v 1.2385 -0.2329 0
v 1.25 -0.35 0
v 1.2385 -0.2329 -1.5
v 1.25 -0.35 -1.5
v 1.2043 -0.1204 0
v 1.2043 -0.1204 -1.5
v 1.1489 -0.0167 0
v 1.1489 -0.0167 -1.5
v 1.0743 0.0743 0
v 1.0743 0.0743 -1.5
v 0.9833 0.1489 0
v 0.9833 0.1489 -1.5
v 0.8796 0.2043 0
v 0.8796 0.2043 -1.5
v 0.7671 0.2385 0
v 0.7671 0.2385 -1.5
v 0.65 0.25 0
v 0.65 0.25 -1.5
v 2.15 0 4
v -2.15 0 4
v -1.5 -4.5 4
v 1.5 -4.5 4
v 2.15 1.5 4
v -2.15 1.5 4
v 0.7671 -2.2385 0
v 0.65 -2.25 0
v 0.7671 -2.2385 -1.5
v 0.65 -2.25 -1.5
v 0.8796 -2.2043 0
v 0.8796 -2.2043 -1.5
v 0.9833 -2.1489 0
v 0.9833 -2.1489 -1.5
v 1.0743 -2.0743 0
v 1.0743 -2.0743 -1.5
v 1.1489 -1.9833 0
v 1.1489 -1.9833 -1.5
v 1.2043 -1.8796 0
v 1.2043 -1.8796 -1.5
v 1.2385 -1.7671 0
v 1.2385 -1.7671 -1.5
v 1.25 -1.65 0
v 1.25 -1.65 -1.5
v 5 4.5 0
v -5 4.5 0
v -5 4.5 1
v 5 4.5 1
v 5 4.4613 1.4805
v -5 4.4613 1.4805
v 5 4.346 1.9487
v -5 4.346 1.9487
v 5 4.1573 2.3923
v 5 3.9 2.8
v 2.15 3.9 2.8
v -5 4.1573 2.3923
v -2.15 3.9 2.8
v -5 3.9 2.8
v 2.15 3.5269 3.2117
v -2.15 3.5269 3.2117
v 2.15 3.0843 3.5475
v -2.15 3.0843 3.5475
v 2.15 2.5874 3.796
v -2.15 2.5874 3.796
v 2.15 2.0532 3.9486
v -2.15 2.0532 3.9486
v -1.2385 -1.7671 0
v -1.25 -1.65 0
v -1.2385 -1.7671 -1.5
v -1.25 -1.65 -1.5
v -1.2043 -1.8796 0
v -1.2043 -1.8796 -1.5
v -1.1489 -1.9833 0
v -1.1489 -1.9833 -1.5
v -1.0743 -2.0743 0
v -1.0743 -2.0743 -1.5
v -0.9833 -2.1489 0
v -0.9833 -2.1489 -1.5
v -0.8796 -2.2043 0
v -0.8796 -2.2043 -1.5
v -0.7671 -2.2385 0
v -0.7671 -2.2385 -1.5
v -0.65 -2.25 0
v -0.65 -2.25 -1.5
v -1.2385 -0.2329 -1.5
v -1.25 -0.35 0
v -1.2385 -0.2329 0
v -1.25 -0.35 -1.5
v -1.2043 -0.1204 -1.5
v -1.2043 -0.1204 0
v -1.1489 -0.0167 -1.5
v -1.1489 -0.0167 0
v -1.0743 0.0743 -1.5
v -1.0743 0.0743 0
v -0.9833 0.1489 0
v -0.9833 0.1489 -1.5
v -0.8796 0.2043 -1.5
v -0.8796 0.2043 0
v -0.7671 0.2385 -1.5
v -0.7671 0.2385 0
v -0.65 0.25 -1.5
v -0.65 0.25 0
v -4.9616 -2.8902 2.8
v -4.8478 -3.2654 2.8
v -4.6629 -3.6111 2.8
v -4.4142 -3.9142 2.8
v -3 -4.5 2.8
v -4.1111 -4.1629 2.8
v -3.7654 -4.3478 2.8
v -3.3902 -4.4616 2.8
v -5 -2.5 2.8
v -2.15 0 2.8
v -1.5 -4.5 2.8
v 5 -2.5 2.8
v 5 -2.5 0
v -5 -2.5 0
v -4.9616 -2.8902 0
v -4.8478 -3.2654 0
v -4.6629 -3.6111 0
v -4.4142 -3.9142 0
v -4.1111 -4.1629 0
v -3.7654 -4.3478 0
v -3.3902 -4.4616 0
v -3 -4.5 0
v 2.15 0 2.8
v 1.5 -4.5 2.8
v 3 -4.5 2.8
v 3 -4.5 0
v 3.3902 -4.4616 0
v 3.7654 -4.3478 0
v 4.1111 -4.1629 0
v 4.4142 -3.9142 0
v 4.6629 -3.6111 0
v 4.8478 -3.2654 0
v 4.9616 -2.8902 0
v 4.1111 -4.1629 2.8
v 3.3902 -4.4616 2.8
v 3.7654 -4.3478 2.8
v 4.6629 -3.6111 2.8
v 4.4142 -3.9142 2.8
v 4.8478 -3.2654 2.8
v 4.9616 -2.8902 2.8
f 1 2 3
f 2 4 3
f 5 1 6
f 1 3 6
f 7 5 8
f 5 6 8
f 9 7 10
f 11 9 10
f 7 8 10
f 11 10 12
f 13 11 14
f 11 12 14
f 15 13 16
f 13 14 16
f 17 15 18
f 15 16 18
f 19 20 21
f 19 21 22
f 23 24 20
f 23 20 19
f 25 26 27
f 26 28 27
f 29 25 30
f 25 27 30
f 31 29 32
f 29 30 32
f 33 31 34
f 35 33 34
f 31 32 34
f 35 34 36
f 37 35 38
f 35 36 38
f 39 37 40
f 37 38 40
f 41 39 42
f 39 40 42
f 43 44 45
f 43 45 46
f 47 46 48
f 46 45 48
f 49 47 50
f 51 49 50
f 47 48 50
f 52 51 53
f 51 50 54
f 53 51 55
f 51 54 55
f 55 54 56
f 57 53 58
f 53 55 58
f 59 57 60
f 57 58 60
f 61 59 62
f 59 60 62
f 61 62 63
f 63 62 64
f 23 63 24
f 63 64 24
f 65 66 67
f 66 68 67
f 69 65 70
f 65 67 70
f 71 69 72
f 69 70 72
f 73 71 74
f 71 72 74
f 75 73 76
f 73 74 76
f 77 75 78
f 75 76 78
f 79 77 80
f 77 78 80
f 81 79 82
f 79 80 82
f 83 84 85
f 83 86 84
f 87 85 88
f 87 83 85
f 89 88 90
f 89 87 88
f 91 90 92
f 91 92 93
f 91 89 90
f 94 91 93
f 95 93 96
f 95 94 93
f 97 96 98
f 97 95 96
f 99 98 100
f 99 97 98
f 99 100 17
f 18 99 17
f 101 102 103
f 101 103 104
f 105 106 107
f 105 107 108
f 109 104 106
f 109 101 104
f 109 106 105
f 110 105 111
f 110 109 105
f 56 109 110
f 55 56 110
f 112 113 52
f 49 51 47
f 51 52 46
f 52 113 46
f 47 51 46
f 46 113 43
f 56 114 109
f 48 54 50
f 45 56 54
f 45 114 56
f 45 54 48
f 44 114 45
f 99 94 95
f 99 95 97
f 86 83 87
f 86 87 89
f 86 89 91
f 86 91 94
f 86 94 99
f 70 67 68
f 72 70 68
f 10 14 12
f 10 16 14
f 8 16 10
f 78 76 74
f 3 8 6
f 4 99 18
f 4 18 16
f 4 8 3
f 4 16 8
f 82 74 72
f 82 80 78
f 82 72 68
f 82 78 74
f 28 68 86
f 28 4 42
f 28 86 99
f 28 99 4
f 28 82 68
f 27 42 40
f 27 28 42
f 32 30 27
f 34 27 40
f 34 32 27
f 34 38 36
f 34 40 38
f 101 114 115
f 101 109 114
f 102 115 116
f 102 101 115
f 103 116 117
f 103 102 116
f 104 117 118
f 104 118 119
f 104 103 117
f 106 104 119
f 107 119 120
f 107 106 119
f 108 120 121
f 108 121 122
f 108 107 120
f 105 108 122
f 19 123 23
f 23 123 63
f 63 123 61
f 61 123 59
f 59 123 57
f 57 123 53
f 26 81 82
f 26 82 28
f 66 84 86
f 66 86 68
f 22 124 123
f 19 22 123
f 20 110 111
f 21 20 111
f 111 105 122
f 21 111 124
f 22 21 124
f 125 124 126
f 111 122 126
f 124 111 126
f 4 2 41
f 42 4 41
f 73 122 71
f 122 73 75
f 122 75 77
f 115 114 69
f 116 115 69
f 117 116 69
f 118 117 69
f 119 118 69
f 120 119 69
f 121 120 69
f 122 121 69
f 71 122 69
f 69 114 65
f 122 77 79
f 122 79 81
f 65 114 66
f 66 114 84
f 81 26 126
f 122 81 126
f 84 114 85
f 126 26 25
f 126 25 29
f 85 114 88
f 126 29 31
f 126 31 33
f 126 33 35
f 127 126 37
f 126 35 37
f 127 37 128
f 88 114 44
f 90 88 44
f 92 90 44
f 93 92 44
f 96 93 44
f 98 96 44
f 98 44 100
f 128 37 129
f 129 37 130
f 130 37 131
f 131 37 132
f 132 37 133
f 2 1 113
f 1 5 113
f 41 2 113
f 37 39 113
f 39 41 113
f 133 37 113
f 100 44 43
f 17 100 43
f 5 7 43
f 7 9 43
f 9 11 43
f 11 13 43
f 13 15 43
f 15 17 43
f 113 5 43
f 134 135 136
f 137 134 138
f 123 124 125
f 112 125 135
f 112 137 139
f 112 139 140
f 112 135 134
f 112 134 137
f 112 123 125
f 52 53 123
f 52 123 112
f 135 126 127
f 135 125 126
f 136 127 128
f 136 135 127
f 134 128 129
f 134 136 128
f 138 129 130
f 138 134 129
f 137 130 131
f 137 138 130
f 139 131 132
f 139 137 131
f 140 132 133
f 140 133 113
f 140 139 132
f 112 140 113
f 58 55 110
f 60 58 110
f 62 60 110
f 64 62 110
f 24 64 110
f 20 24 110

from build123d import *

# Parameters (mm, degrees)
F0_W     = 10
F0_H     = 9
F1_DEPTH = 2.8
F3_DEPTH = 1.2
F4_W     = 2.5
F4_H     = 2.5
F5_DEPTH = 1.5
F6_R     = 2
F7_R     = 3
F8_R     = 0.6


with BuildPart() as f1:
    # F0 (on Top) → F1 (new body)
    with BuildSketch(Plane.XY):
        Rectangle(F0_W, F0_H)
    extrude(amount=F1_DEPTH)

    # F2 (on face) → F3 (join)
    with BuildSketch(Plane.XY.offset(2.8)):
        Polygon((2.15, 4.5), (-2.15, 4.5), (-2.15, 0), (-1.5, -4.5), (1.5, -4.5), (2.15, 0), align=None)
    extrude(amount=F3_DEPTH)

    # F4 (on face) → F5 (join)
    with BuildSketch(Plane(origin=(0, 0, 0), x_dir=(1, 0, 0), z_dir=(0, 0, -1))):
        with Locations((0, 1)):
            Rectangle(F4_W, F4_H)
    extrude(amount=F5_DEPTH)

    # F6
    f6_edges = [f1.edges().sort_by_distance(p)[0] for p in [
        (5, -4.5, 1.4),
        (-5, -4.5, 1.4),
    ]]
    fillet(f6_edges, radius=F6_R)

    # F7
    f7_edges = [f1.edges().sort_by_distance(p)[0] for p in [
        (0, 4.5, 4),
    ]]
    fillet(f7_edges, radius=F7_R)

    # F8
    f8_edges = [f1.edges().sort_by_distance(p)[0] for p in [
        (1.25, -2.25, -0.75),
        (-1.25, -2.25, -0.75),
        (1.25, 0.25, -0.75),
        (-1.25, 0.25, -0.75),
    ]]
    fillet(f8_edges, radius=F8_R)


solid = f1.part
